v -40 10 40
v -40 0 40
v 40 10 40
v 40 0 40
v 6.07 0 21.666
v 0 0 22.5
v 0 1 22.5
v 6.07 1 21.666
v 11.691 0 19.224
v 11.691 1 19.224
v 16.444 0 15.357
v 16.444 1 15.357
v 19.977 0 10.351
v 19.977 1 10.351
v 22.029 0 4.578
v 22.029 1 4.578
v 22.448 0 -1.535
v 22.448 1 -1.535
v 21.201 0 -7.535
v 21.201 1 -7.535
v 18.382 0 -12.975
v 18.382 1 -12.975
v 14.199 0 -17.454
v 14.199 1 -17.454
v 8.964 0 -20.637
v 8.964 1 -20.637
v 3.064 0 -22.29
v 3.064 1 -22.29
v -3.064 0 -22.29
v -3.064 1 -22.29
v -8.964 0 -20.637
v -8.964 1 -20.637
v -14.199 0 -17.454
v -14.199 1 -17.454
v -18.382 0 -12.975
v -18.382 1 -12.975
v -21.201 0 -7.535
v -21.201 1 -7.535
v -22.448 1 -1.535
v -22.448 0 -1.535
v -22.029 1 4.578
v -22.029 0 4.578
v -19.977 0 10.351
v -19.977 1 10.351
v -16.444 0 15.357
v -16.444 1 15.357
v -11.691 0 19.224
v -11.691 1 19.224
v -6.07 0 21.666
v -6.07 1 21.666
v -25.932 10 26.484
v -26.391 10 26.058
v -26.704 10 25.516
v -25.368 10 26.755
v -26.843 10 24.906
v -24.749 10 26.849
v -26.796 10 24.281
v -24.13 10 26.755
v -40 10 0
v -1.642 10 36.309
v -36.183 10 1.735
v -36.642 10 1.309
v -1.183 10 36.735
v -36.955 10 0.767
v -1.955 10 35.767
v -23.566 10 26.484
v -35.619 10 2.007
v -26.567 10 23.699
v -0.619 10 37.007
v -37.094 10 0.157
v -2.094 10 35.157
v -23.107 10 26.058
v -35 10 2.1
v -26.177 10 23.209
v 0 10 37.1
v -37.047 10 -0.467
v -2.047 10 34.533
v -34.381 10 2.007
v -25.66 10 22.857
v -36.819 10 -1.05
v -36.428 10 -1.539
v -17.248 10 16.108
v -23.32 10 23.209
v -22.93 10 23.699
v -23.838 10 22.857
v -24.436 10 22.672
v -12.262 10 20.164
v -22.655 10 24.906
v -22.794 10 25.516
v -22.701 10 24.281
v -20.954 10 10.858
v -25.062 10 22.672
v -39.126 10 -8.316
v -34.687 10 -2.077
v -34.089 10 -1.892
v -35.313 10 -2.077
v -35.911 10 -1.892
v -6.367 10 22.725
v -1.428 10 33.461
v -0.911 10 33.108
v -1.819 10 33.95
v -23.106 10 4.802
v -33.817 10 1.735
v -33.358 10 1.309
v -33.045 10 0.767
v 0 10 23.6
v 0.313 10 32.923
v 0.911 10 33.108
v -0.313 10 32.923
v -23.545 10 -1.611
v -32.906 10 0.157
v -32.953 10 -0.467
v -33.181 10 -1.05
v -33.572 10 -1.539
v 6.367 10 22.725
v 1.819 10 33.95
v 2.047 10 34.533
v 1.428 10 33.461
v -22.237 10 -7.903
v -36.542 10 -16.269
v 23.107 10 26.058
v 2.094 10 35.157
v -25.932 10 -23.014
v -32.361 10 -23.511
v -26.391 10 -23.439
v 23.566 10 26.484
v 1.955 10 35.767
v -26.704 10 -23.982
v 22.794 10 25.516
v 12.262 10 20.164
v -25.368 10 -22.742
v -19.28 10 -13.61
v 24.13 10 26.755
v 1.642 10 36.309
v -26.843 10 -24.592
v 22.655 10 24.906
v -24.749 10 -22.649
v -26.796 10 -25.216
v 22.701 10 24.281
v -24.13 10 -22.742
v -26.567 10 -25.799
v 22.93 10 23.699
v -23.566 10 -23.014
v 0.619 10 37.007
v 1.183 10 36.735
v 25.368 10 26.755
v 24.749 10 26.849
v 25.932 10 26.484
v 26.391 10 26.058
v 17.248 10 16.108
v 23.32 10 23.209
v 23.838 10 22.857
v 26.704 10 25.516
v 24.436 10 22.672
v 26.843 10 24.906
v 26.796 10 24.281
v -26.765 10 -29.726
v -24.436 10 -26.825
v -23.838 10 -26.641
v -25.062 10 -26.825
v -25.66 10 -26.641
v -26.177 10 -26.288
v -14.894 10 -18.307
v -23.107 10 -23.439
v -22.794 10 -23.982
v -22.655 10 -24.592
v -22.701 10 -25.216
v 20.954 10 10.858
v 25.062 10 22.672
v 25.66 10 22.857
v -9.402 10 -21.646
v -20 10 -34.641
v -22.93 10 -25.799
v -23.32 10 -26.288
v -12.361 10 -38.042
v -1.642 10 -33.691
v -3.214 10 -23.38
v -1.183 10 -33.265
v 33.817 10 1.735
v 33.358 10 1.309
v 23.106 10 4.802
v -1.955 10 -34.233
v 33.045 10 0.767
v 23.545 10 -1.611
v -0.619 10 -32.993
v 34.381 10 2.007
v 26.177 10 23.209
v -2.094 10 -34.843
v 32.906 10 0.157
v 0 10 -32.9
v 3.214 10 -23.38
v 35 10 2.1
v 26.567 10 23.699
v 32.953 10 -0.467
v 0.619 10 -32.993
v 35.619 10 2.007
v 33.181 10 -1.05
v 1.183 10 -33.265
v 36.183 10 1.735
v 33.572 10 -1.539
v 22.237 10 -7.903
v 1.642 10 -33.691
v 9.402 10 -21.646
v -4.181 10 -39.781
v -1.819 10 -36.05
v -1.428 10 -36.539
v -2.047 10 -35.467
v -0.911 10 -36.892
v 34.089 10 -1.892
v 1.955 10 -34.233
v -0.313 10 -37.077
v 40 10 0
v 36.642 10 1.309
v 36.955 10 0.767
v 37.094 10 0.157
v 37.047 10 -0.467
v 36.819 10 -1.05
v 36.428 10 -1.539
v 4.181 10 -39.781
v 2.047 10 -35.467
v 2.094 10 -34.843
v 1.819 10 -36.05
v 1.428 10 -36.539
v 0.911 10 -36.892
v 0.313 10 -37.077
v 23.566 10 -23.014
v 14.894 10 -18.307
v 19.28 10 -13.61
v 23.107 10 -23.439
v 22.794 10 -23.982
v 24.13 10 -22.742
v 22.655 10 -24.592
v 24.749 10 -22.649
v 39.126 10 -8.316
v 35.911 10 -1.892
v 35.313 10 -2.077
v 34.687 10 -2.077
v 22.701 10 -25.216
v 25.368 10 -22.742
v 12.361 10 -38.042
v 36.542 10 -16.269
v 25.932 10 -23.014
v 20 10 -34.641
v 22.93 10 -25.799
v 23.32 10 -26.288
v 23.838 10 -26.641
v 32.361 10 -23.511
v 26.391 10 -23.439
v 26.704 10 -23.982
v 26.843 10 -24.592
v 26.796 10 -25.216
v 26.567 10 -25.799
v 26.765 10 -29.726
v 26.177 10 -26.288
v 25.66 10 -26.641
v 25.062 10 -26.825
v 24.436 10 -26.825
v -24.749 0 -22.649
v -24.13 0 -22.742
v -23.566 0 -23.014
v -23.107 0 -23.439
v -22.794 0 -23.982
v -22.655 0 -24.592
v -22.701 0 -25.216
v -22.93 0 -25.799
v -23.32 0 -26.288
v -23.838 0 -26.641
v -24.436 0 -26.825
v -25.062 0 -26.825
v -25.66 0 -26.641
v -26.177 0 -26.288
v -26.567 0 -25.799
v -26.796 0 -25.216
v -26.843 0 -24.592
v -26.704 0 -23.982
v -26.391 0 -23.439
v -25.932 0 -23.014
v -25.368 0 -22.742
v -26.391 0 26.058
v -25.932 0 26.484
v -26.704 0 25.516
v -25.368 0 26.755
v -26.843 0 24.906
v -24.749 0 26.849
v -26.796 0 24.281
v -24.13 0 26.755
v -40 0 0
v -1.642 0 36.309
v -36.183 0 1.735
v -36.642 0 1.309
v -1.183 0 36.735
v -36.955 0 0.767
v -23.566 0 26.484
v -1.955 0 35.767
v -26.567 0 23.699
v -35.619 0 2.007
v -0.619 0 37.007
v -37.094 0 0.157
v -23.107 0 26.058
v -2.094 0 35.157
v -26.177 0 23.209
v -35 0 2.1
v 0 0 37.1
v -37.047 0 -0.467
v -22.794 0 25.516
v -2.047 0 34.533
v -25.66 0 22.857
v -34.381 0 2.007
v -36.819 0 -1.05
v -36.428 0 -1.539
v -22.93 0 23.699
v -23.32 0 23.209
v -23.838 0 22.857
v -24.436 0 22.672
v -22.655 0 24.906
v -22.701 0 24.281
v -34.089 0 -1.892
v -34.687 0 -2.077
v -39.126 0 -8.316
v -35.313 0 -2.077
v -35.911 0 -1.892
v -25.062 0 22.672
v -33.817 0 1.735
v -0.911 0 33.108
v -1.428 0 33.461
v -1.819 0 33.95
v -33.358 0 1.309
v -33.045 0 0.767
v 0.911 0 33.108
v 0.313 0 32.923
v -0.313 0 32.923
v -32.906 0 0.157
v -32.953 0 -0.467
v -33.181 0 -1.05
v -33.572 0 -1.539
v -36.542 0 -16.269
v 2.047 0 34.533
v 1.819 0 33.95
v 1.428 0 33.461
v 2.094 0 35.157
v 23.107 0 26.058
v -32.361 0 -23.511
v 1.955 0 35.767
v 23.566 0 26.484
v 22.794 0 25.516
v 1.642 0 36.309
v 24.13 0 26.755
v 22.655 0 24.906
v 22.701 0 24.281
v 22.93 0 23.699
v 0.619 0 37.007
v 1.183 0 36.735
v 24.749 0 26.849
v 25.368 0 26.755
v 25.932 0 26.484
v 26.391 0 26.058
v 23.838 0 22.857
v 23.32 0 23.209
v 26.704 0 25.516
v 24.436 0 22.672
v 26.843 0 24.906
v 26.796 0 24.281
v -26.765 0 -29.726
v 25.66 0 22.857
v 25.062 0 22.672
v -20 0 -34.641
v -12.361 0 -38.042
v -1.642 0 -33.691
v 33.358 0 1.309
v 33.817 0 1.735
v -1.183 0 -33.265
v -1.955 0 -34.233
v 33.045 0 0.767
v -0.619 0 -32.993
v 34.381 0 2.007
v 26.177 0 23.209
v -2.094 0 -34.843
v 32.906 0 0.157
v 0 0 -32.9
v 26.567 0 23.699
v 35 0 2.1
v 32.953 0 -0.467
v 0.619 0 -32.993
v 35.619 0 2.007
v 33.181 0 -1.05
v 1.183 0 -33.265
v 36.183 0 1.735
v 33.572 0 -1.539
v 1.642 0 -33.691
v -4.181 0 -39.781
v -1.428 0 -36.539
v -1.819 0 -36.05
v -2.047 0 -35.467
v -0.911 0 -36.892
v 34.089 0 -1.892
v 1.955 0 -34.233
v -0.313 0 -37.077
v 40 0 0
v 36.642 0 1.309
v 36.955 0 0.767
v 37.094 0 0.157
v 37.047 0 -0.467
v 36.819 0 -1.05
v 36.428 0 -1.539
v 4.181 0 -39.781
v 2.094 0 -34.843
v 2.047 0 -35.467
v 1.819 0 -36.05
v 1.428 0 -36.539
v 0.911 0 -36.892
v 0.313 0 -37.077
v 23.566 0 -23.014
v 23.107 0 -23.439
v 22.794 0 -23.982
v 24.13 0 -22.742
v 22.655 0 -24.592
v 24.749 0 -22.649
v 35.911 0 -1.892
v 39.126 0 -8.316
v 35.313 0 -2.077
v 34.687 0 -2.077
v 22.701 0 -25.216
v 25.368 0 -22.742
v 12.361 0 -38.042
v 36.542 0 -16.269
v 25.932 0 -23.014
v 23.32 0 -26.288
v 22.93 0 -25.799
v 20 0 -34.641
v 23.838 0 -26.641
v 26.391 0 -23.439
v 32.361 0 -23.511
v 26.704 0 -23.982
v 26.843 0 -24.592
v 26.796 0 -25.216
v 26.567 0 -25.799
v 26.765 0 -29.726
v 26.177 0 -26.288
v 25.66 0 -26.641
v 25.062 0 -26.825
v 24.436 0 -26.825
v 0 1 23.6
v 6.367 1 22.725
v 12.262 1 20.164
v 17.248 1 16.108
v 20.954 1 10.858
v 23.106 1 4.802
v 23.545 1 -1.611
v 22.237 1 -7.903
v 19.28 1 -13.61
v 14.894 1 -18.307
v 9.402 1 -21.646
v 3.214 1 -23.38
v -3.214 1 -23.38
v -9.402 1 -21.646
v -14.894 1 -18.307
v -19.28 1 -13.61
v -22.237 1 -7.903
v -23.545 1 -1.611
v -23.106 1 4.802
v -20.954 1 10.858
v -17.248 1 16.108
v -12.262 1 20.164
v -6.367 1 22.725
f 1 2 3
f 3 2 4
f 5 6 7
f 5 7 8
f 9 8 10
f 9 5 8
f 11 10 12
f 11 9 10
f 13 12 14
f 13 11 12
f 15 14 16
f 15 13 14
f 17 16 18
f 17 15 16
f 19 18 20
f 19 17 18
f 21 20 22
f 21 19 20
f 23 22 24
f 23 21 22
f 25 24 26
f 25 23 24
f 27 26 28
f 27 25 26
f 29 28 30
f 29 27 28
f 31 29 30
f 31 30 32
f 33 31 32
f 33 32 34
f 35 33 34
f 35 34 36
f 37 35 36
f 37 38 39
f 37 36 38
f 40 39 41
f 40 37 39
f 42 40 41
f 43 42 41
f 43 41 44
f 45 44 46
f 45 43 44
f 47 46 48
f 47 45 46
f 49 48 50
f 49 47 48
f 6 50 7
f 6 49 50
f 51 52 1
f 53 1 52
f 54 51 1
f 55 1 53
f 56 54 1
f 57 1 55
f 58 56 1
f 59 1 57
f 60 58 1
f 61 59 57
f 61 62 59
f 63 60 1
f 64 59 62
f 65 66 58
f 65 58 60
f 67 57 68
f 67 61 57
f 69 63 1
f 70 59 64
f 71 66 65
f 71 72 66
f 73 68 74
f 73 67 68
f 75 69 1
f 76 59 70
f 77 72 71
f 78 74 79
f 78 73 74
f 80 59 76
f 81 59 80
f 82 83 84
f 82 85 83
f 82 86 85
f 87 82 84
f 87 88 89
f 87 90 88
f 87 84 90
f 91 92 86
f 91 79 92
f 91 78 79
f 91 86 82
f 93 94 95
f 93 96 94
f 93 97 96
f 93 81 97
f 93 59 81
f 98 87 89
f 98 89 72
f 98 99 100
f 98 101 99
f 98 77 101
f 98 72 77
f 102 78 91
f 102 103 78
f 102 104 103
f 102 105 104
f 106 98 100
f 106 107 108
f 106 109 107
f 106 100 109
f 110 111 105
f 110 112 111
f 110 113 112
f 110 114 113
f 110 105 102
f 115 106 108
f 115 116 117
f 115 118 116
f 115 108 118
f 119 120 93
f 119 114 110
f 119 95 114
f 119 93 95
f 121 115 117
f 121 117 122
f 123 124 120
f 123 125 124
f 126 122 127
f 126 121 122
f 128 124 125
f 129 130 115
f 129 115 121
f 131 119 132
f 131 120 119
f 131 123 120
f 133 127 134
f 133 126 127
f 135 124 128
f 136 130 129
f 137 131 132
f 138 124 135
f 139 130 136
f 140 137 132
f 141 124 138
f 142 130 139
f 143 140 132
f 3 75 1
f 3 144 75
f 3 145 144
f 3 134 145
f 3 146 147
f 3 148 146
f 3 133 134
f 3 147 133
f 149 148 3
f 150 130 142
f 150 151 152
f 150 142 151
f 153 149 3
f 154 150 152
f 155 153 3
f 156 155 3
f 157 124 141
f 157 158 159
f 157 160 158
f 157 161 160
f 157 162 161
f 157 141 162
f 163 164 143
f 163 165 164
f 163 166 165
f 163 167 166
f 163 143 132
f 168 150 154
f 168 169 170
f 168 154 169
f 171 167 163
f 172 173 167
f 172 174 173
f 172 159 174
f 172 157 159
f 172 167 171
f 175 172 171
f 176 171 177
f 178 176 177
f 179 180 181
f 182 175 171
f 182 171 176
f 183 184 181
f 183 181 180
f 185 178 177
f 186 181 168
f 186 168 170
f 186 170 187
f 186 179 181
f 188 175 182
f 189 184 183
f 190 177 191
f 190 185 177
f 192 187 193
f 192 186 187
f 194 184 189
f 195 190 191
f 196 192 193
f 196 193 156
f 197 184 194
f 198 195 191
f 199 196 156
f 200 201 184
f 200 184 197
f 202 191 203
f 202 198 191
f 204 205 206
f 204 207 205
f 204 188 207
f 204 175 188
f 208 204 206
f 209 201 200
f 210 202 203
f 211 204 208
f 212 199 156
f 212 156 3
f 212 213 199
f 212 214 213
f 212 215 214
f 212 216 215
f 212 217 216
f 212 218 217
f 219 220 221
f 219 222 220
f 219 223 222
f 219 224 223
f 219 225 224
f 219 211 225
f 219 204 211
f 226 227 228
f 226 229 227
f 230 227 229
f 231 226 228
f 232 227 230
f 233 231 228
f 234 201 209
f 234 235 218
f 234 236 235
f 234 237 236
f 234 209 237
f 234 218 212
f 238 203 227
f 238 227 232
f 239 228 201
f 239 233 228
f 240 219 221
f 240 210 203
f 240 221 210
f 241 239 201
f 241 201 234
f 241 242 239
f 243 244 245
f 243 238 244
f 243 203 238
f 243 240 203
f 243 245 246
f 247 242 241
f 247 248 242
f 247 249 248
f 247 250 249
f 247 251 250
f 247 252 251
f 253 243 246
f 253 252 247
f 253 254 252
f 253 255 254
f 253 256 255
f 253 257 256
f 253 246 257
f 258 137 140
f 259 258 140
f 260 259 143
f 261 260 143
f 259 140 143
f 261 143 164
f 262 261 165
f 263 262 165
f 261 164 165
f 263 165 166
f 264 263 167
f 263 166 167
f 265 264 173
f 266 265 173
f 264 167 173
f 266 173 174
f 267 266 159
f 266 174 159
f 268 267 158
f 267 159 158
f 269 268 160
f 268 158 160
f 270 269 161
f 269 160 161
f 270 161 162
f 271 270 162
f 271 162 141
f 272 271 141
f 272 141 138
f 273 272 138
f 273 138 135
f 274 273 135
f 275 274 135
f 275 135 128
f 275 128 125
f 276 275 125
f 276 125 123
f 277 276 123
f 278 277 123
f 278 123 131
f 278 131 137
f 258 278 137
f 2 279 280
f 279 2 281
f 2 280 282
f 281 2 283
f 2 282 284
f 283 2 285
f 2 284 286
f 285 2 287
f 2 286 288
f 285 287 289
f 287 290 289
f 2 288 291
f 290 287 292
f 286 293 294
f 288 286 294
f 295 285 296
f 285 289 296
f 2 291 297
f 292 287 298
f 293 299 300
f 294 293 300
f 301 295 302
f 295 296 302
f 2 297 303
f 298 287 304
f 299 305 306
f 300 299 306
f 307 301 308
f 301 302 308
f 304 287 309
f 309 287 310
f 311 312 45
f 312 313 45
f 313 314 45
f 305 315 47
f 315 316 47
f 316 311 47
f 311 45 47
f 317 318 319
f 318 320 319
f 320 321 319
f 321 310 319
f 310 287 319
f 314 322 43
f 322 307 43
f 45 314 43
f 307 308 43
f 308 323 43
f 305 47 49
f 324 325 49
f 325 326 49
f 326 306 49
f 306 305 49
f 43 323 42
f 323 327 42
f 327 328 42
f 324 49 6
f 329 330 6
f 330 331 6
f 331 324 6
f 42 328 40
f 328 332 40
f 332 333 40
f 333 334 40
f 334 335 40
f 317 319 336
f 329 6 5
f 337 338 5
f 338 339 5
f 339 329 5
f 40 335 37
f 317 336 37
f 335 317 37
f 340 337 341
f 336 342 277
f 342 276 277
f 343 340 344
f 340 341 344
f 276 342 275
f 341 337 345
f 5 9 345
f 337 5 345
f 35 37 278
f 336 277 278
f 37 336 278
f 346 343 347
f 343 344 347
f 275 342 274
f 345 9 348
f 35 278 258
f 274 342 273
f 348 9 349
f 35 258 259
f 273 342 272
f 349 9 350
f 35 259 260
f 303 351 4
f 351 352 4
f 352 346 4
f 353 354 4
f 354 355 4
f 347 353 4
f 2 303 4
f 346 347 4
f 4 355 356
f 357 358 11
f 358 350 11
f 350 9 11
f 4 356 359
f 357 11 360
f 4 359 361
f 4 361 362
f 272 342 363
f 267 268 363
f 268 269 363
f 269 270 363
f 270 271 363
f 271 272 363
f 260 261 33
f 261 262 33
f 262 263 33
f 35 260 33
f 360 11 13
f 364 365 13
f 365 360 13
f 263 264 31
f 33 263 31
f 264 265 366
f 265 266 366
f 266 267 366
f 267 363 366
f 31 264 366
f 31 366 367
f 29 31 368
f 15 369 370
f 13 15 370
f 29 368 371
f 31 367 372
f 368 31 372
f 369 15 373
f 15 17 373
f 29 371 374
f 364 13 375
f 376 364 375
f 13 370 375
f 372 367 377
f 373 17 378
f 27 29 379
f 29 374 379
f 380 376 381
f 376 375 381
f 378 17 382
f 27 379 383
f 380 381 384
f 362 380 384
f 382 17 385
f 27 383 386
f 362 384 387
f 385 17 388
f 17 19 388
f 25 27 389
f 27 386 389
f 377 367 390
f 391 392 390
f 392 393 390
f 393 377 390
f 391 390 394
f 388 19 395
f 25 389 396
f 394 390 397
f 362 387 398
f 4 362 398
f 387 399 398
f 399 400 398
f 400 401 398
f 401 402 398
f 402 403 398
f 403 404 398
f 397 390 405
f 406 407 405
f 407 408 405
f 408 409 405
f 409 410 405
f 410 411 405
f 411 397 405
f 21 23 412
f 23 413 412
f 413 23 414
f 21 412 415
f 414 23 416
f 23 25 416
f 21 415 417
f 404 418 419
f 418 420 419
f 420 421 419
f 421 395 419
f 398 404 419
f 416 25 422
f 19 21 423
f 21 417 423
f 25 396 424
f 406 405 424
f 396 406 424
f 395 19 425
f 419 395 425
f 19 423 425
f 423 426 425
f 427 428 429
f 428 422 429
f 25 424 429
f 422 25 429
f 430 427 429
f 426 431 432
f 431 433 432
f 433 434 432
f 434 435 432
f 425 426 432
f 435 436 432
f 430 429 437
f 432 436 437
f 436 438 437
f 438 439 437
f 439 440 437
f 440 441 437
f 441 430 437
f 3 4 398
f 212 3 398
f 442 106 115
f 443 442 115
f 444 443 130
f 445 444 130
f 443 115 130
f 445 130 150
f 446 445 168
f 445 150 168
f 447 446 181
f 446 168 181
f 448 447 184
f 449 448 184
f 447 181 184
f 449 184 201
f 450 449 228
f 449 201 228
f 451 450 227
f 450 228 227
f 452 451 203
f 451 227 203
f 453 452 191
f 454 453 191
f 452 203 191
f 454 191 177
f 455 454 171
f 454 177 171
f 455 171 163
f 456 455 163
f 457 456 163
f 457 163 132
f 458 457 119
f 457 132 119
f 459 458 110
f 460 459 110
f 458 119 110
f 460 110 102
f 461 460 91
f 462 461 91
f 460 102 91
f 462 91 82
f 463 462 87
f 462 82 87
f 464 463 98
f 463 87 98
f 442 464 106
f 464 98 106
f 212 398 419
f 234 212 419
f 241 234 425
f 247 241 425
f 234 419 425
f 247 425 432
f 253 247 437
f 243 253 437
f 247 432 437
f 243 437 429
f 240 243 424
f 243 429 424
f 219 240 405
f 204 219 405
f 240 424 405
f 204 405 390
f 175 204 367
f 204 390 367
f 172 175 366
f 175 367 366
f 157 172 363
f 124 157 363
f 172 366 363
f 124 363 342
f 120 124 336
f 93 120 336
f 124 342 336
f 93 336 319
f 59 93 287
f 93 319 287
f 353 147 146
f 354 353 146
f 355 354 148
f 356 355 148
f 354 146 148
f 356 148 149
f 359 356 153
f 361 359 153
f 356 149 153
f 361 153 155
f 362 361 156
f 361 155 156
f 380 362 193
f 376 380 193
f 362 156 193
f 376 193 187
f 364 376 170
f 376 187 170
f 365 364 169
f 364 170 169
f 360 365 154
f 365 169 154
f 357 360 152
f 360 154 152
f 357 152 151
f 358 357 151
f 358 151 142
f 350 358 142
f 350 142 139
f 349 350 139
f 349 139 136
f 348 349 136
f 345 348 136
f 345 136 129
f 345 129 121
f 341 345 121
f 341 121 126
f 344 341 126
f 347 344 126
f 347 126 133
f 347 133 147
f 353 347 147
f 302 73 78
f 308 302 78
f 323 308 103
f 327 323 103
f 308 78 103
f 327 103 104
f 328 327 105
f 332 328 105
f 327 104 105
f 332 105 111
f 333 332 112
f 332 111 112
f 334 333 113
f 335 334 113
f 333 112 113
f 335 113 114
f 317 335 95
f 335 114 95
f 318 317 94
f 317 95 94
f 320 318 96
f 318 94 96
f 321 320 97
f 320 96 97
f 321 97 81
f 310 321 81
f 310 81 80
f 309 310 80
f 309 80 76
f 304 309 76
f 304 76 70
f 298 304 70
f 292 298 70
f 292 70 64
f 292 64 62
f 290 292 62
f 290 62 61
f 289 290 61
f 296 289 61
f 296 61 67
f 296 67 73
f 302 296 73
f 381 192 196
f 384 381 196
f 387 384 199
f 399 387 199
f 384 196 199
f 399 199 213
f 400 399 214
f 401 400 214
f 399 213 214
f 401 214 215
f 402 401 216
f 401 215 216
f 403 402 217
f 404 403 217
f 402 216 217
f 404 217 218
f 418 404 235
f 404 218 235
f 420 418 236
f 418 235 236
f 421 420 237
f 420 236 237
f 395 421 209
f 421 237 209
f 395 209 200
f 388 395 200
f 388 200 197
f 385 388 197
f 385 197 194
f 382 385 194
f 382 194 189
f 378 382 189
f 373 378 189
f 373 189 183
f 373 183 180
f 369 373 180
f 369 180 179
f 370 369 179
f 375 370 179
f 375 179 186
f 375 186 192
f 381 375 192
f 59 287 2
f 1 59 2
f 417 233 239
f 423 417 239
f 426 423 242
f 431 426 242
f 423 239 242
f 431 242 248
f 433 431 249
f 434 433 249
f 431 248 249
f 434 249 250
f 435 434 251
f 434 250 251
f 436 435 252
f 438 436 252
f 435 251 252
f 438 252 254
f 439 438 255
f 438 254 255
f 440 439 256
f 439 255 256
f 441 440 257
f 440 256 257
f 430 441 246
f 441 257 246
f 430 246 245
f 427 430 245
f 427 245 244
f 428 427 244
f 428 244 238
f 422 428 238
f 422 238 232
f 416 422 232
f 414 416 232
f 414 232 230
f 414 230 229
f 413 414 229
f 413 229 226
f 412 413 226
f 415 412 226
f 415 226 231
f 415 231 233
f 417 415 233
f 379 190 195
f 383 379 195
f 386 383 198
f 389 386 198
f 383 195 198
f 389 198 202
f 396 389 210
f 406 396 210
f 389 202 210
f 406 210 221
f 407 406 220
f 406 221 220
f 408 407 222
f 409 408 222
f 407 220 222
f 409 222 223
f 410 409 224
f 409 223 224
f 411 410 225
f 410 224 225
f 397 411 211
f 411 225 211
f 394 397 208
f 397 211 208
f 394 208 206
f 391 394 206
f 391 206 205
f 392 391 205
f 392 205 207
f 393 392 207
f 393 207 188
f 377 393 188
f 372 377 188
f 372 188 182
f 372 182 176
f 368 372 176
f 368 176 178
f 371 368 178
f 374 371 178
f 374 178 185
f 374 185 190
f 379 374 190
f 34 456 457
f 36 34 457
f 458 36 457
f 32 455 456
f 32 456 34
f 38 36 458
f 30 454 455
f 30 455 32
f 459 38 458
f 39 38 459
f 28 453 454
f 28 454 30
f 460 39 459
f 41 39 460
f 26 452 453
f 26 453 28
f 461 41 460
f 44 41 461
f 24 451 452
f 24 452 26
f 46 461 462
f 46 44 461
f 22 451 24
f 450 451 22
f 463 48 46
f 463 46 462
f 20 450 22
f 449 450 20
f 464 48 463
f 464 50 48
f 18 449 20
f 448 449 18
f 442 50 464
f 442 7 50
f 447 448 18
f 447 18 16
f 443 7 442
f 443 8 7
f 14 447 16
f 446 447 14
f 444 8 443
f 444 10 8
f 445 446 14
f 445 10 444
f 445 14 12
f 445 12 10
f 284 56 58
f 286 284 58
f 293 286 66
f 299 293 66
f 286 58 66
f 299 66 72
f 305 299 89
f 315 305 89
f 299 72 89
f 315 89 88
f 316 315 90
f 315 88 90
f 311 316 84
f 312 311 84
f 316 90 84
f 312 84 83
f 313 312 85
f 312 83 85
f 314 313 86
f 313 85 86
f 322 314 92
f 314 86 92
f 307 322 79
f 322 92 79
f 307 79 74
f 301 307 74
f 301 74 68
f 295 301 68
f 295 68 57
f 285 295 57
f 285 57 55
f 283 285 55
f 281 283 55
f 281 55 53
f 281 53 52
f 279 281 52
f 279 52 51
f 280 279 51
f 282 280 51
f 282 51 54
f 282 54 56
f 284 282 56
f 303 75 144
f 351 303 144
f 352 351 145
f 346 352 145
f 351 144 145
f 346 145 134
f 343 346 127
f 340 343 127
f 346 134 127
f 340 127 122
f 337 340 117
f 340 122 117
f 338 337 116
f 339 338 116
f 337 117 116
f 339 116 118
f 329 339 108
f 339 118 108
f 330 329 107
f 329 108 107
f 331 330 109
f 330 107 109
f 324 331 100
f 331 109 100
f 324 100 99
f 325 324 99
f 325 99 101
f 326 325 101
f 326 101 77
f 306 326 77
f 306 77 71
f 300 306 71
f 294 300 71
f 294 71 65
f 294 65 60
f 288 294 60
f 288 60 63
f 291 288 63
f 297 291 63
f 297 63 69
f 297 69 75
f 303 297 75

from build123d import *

# Parameters (mm, degrees)
SKETCH_1_R          = 22.5
EXTRUDE_1_DEPTH     = 10
SKETCH_2_R          = 2.1
CUT_EXTRUDE_1_DEPTH = 58.445626465
SKETCH_5_R          = 23.6
CUT_EXTRUDE_2_DEPTH = 9


with BuildPart() as part:
    # 草图1 → 凸台-拉伸1 (new body)
    with BuildSketch(Plane(origin=(0, 0, 0), x_dir=(1, 0, 0), z_dir=(0, 1, 0))):
        with BuildLine():
            Line((-40, 0), (-40, -40))
            Line((-40, -40), (40, -40))
            Line((40, -40), (40, 0))
            ThreePointArc((40, 0), (0, 40), (-40, 0))
        make_face()
        with Locations(Location((0, 0, 0), (0, 0, 270))):
            Circle(SKETCH_1_R, mode=Mode.SUBTRACT)
    extrude(amount=EXTRUDE_1_DEPTH)

    # 草图2 → 切除-拉伸1 (cut, through all)
    with BuildSketch(Plane(origin=(0, 10, 0), x_dir=(1, 0, 0), z_dir=(0, 1, 0))):
        with Locations(Location((0, 35, 0), (0, 0, 270))):
            Circle(SKETCH_2_R)
        with Locations(Location((24.748737342, 24.748737342, 0), (0, 0, 270))):
            Circle(SKETCH_2_R)
        with Locations(Location((35, 0, 0), (0, 0, 270))):
            Circle(SKETCH_2_R)
        with Locations(Location((24.748737342, -24.748737342, 0), (0, 0, 270))):
            Circle(SKETCH_2_R)
        with Locations(Location((0, -35, 0), (0, 0, 270))):
            Circle(SKETCH_2_R)
        with Locations(Location((-24.748737342, -24.748737342, 0), (0, 0, 270))):
            Circle(SKETCH_2_R)
        with Locations(Location((-35, 0, 0), (0, 0, 270))):
            Circle(SKETCH_2_R)
        with Locations(Location((-24.748737342, 24.748737342, 0), (0, 0, 270))):
            Circle(SKETCH_2_R)
    extrude(amount=-CUT_EXTRUDE_1_DEPTH, mode=Mode.SUBTRACT)

    # 草图5 → 切除-拉伸2 (cut)
    with BuildSketch(Plane(origin=(0, 10, 0), x_dir=(1, 0, 0), z_dir=(0, 1, 0))):
        with Locations(Location((0, 0, 0), (0, 0, 270))):
            Circle(SKETCH_5_R)
    extrude(amount=-CUT_EXTRUDE_2_DEPTH, mode=Mode.SUBTRACT)


solid = part.part
